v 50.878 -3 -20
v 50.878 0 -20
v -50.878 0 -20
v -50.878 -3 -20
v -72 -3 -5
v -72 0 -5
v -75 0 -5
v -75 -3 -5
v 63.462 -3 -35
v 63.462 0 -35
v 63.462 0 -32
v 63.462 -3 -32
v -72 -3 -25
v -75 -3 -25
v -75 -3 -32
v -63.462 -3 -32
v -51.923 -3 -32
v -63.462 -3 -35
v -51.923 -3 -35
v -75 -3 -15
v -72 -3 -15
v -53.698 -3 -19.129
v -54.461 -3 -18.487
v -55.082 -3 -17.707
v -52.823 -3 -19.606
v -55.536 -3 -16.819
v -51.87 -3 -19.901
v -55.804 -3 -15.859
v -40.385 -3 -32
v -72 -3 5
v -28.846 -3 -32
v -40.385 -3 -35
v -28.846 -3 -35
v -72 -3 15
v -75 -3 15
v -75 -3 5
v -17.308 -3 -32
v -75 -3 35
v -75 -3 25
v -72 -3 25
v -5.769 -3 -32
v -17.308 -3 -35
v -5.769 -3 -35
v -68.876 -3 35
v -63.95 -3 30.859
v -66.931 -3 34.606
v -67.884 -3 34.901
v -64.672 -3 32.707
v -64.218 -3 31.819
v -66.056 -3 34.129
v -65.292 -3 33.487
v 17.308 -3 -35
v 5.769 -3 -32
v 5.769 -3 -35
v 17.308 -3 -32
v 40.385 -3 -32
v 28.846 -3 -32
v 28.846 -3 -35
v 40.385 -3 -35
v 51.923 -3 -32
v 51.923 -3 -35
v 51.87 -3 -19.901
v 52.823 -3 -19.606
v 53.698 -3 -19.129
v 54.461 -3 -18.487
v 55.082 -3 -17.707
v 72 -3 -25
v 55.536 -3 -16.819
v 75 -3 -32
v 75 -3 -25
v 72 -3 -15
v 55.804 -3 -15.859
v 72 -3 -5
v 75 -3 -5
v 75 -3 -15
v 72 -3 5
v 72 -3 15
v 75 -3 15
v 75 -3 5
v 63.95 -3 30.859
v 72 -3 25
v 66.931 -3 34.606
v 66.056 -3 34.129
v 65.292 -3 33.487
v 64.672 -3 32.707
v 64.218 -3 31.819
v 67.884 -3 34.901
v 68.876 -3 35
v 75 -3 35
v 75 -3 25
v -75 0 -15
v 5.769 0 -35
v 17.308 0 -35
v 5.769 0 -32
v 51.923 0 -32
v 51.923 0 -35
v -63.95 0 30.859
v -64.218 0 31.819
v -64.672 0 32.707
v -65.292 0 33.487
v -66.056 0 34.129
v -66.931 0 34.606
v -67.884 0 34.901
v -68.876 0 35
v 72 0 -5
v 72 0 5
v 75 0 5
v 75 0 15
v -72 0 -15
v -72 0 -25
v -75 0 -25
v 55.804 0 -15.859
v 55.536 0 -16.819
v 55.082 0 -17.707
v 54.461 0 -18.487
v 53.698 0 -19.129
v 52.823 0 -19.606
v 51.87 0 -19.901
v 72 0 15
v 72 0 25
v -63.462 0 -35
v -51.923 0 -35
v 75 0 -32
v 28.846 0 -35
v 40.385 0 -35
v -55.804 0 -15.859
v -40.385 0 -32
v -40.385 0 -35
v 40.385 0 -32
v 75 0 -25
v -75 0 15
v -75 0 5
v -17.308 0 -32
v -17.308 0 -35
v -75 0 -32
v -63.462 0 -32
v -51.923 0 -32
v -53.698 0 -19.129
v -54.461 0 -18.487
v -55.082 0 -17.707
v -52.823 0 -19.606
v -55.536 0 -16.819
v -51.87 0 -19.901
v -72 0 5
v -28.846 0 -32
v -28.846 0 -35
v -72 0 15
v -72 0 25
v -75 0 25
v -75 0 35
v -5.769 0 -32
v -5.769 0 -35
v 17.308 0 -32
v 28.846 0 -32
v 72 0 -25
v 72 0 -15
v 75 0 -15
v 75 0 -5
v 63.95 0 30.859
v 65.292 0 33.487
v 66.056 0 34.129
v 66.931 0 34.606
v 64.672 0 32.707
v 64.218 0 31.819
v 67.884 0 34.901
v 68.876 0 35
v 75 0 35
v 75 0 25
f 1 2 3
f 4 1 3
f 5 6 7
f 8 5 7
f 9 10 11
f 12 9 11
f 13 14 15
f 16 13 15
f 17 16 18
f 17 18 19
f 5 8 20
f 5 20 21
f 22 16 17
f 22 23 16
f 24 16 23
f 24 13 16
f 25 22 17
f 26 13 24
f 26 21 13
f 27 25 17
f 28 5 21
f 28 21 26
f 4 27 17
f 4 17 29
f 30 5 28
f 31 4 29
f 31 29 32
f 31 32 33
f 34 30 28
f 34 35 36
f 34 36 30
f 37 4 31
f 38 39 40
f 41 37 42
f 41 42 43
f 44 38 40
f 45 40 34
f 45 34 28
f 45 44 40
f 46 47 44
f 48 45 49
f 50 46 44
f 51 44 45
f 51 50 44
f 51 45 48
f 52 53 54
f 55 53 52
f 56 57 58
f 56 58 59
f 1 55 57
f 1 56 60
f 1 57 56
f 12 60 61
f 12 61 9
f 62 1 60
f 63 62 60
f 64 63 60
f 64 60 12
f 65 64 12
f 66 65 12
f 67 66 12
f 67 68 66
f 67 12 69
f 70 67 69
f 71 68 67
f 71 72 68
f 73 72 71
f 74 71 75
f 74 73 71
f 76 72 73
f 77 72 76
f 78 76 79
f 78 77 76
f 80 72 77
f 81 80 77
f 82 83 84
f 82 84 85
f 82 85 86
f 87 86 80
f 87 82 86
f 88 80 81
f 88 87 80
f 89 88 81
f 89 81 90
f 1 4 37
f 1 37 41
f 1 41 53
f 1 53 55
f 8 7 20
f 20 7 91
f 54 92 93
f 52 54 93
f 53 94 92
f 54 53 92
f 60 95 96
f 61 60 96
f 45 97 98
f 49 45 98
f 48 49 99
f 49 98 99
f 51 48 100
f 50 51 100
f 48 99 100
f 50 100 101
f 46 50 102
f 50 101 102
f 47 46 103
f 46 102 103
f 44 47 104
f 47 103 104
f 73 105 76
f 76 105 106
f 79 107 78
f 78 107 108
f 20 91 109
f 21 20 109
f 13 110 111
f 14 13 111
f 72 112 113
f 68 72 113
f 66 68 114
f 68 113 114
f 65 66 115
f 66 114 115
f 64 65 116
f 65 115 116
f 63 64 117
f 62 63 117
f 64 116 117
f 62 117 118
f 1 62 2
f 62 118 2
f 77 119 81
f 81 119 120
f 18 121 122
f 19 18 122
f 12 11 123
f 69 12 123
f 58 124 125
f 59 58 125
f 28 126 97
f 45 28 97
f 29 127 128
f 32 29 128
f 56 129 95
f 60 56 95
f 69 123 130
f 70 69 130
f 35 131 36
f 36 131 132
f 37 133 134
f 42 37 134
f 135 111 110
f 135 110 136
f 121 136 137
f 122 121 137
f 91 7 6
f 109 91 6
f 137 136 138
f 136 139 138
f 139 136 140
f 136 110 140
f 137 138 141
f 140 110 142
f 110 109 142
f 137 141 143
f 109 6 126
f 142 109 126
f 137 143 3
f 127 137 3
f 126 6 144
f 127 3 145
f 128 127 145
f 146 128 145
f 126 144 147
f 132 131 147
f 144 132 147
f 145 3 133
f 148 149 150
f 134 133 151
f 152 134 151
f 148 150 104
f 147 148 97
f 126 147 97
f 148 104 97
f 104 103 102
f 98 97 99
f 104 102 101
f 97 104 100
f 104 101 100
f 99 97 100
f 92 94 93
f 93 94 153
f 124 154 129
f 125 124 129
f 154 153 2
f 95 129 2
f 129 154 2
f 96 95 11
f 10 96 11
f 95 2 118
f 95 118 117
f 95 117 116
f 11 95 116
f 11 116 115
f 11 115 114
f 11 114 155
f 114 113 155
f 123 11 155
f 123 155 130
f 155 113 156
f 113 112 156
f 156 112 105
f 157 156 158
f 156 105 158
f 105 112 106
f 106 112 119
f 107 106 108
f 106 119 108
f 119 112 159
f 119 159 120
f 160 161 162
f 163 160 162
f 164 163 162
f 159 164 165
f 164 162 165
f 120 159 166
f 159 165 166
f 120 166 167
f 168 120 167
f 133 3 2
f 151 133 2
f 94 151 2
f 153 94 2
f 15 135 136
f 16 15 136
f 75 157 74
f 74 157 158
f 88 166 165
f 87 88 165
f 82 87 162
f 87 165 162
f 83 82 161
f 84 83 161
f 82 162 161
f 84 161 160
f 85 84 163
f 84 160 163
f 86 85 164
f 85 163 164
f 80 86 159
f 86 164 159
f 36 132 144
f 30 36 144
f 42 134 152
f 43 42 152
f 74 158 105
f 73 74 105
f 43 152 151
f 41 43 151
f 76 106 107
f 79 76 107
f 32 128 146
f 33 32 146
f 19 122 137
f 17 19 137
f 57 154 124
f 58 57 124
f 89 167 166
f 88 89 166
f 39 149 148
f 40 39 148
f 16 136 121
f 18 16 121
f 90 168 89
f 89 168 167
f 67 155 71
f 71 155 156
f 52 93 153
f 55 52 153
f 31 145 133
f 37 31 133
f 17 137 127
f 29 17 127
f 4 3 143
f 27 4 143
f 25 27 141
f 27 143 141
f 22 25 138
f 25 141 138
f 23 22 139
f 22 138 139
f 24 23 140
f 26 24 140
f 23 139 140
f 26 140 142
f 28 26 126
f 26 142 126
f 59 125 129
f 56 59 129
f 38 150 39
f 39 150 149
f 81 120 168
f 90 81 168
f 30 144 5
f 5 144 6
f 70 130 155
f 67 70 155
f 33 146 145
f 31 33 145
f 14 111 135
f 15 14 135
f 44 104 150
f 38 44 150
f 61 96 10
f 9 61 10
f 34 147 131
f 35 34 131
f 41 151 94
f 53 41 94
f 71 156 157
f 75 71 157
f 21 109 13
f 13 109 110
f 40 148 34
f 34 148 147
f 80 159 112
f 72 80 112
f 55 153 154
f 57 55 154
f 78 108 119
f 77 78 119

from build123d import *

# Parameters (mm, degrees)
F1_DEPTH = 3


with BuildPart() as f1:
    # F0 (on Front) → F1 (new body)
    with BuildSketch(Plane.XZ):
        with BuildLine():
            Line((75, 25), (75, 35))
            Line((75, 35), (68.875617, 35))
            ThreePointArc((68.875617, 35), (65.658037, 33.827163), (63.949936, 30.858872))
            Line((63.949936, 30.858872), (55.803943, -15.858872))
            ThreePointArc((55.803943, -15.858872), (54.095841, -18.827163), (50.878261, -20))
            Line((50.878261, -20), (0, -20))
            Line((0, -20), (-50.878261, -20))
            ThreePointArc((-50.878261, -20), (-54.095841, -18.827163), (-55.803943, -15.858872))
            Line((-55.803943, -15.858872), (-63.949936, 30.858872))
            ThreePointArc((-63.949936, 30.858872), (-65.658037, 33.827163), (-68.875617, 35))
            Line((-68.875617, 35), (-75, 35))
            Line((-75, 35), (-75, 25))
            Line((-75, 25), (-72, 25))
            Line((-72, 25), (-72, 15))
            Line((-72, 15), (-75, 15))
            Line((-75, 15), (-75, 5))
            Line((-75, 5), (-72, 5))
            Line((-72, 5), (-72, -5))
            Line((-72, -5), (-75, -5))
            Line((-75, -5), (-75, -15))
            Line((-75, -15), (-72, -15))
            Line((-72, -15), (-72, -25))
            Line((-72, -25), (-75, -25))
            Line((-75, -25), (-75, -32))
            Line((-75, -32), (-63.461538, -32))
            Line((-63.461538, -32), (-63.461538, -35))
            Line((-63.461538, -35), (-51.923077, -35))
            Line((-51.923077, -35), (-51.923077, -32))
            Line((-51.923077, -32), (-40.384615, -32))
            Line((-40.384615, -32), (-40.384615, -35))
            Line((-40.384615, -35), (-28.846154, -35))
            Line((-28.846154, -35), (-28.846154, -32))
            Line((-28.846154, -32), (-17.307692, -32))
            Line((-17.307692, -32), (-17.307692, -35))
            Line((-17.307692, -35), (-5.769231, -35))
            Line((-5.769231, -35), (-5.769231, -32))
            Line((-5.769231, -32), (5.769231, -32))
            Line((5.769231, -32), (5.769231, -35))
            Line((5.769231, -35), (17.307692, -35))
            Line((17.307692, -35), (17.307692, -32))
            Line((17.307692, -32), (28.846154, -32))
            Line((28.846154, -32), (28.846154, -35))
            Line((28.846154, -35), (40.384615, -35))
            Line((40.384615, -35), (40.384615, -32))
            Line((40.384615, -32), (51.923077, -32))
            Line((51.923077, -32), (51.923077, -35))
            Line((51.923077, -35), (63.461538, -35))
            Line((63.461538, -35), (63.461538, -32))
            Line((63.461538, -32), (75, -32))
            Line((75, -32), (75, -25))
            Line((75, -25), (72, -25))
            Line((72, -25), (72, -15))
            Line((72, -15), (75, -15))
            Line((75, -15), (75, -5))
            Line((75, -5), (72, -5))
            Line((72, -5), (72, 5))
            Line((72, 5), (75, 5))
            Line((75, 5), (75, 15))
            Line((75, 15), (72, 15))
            Line((72, 15), (72, 25))
            Line((72, 25), (75, 25))
        make_face()
    extrude(amount=F1_DEPTH)


solid = f1.part
